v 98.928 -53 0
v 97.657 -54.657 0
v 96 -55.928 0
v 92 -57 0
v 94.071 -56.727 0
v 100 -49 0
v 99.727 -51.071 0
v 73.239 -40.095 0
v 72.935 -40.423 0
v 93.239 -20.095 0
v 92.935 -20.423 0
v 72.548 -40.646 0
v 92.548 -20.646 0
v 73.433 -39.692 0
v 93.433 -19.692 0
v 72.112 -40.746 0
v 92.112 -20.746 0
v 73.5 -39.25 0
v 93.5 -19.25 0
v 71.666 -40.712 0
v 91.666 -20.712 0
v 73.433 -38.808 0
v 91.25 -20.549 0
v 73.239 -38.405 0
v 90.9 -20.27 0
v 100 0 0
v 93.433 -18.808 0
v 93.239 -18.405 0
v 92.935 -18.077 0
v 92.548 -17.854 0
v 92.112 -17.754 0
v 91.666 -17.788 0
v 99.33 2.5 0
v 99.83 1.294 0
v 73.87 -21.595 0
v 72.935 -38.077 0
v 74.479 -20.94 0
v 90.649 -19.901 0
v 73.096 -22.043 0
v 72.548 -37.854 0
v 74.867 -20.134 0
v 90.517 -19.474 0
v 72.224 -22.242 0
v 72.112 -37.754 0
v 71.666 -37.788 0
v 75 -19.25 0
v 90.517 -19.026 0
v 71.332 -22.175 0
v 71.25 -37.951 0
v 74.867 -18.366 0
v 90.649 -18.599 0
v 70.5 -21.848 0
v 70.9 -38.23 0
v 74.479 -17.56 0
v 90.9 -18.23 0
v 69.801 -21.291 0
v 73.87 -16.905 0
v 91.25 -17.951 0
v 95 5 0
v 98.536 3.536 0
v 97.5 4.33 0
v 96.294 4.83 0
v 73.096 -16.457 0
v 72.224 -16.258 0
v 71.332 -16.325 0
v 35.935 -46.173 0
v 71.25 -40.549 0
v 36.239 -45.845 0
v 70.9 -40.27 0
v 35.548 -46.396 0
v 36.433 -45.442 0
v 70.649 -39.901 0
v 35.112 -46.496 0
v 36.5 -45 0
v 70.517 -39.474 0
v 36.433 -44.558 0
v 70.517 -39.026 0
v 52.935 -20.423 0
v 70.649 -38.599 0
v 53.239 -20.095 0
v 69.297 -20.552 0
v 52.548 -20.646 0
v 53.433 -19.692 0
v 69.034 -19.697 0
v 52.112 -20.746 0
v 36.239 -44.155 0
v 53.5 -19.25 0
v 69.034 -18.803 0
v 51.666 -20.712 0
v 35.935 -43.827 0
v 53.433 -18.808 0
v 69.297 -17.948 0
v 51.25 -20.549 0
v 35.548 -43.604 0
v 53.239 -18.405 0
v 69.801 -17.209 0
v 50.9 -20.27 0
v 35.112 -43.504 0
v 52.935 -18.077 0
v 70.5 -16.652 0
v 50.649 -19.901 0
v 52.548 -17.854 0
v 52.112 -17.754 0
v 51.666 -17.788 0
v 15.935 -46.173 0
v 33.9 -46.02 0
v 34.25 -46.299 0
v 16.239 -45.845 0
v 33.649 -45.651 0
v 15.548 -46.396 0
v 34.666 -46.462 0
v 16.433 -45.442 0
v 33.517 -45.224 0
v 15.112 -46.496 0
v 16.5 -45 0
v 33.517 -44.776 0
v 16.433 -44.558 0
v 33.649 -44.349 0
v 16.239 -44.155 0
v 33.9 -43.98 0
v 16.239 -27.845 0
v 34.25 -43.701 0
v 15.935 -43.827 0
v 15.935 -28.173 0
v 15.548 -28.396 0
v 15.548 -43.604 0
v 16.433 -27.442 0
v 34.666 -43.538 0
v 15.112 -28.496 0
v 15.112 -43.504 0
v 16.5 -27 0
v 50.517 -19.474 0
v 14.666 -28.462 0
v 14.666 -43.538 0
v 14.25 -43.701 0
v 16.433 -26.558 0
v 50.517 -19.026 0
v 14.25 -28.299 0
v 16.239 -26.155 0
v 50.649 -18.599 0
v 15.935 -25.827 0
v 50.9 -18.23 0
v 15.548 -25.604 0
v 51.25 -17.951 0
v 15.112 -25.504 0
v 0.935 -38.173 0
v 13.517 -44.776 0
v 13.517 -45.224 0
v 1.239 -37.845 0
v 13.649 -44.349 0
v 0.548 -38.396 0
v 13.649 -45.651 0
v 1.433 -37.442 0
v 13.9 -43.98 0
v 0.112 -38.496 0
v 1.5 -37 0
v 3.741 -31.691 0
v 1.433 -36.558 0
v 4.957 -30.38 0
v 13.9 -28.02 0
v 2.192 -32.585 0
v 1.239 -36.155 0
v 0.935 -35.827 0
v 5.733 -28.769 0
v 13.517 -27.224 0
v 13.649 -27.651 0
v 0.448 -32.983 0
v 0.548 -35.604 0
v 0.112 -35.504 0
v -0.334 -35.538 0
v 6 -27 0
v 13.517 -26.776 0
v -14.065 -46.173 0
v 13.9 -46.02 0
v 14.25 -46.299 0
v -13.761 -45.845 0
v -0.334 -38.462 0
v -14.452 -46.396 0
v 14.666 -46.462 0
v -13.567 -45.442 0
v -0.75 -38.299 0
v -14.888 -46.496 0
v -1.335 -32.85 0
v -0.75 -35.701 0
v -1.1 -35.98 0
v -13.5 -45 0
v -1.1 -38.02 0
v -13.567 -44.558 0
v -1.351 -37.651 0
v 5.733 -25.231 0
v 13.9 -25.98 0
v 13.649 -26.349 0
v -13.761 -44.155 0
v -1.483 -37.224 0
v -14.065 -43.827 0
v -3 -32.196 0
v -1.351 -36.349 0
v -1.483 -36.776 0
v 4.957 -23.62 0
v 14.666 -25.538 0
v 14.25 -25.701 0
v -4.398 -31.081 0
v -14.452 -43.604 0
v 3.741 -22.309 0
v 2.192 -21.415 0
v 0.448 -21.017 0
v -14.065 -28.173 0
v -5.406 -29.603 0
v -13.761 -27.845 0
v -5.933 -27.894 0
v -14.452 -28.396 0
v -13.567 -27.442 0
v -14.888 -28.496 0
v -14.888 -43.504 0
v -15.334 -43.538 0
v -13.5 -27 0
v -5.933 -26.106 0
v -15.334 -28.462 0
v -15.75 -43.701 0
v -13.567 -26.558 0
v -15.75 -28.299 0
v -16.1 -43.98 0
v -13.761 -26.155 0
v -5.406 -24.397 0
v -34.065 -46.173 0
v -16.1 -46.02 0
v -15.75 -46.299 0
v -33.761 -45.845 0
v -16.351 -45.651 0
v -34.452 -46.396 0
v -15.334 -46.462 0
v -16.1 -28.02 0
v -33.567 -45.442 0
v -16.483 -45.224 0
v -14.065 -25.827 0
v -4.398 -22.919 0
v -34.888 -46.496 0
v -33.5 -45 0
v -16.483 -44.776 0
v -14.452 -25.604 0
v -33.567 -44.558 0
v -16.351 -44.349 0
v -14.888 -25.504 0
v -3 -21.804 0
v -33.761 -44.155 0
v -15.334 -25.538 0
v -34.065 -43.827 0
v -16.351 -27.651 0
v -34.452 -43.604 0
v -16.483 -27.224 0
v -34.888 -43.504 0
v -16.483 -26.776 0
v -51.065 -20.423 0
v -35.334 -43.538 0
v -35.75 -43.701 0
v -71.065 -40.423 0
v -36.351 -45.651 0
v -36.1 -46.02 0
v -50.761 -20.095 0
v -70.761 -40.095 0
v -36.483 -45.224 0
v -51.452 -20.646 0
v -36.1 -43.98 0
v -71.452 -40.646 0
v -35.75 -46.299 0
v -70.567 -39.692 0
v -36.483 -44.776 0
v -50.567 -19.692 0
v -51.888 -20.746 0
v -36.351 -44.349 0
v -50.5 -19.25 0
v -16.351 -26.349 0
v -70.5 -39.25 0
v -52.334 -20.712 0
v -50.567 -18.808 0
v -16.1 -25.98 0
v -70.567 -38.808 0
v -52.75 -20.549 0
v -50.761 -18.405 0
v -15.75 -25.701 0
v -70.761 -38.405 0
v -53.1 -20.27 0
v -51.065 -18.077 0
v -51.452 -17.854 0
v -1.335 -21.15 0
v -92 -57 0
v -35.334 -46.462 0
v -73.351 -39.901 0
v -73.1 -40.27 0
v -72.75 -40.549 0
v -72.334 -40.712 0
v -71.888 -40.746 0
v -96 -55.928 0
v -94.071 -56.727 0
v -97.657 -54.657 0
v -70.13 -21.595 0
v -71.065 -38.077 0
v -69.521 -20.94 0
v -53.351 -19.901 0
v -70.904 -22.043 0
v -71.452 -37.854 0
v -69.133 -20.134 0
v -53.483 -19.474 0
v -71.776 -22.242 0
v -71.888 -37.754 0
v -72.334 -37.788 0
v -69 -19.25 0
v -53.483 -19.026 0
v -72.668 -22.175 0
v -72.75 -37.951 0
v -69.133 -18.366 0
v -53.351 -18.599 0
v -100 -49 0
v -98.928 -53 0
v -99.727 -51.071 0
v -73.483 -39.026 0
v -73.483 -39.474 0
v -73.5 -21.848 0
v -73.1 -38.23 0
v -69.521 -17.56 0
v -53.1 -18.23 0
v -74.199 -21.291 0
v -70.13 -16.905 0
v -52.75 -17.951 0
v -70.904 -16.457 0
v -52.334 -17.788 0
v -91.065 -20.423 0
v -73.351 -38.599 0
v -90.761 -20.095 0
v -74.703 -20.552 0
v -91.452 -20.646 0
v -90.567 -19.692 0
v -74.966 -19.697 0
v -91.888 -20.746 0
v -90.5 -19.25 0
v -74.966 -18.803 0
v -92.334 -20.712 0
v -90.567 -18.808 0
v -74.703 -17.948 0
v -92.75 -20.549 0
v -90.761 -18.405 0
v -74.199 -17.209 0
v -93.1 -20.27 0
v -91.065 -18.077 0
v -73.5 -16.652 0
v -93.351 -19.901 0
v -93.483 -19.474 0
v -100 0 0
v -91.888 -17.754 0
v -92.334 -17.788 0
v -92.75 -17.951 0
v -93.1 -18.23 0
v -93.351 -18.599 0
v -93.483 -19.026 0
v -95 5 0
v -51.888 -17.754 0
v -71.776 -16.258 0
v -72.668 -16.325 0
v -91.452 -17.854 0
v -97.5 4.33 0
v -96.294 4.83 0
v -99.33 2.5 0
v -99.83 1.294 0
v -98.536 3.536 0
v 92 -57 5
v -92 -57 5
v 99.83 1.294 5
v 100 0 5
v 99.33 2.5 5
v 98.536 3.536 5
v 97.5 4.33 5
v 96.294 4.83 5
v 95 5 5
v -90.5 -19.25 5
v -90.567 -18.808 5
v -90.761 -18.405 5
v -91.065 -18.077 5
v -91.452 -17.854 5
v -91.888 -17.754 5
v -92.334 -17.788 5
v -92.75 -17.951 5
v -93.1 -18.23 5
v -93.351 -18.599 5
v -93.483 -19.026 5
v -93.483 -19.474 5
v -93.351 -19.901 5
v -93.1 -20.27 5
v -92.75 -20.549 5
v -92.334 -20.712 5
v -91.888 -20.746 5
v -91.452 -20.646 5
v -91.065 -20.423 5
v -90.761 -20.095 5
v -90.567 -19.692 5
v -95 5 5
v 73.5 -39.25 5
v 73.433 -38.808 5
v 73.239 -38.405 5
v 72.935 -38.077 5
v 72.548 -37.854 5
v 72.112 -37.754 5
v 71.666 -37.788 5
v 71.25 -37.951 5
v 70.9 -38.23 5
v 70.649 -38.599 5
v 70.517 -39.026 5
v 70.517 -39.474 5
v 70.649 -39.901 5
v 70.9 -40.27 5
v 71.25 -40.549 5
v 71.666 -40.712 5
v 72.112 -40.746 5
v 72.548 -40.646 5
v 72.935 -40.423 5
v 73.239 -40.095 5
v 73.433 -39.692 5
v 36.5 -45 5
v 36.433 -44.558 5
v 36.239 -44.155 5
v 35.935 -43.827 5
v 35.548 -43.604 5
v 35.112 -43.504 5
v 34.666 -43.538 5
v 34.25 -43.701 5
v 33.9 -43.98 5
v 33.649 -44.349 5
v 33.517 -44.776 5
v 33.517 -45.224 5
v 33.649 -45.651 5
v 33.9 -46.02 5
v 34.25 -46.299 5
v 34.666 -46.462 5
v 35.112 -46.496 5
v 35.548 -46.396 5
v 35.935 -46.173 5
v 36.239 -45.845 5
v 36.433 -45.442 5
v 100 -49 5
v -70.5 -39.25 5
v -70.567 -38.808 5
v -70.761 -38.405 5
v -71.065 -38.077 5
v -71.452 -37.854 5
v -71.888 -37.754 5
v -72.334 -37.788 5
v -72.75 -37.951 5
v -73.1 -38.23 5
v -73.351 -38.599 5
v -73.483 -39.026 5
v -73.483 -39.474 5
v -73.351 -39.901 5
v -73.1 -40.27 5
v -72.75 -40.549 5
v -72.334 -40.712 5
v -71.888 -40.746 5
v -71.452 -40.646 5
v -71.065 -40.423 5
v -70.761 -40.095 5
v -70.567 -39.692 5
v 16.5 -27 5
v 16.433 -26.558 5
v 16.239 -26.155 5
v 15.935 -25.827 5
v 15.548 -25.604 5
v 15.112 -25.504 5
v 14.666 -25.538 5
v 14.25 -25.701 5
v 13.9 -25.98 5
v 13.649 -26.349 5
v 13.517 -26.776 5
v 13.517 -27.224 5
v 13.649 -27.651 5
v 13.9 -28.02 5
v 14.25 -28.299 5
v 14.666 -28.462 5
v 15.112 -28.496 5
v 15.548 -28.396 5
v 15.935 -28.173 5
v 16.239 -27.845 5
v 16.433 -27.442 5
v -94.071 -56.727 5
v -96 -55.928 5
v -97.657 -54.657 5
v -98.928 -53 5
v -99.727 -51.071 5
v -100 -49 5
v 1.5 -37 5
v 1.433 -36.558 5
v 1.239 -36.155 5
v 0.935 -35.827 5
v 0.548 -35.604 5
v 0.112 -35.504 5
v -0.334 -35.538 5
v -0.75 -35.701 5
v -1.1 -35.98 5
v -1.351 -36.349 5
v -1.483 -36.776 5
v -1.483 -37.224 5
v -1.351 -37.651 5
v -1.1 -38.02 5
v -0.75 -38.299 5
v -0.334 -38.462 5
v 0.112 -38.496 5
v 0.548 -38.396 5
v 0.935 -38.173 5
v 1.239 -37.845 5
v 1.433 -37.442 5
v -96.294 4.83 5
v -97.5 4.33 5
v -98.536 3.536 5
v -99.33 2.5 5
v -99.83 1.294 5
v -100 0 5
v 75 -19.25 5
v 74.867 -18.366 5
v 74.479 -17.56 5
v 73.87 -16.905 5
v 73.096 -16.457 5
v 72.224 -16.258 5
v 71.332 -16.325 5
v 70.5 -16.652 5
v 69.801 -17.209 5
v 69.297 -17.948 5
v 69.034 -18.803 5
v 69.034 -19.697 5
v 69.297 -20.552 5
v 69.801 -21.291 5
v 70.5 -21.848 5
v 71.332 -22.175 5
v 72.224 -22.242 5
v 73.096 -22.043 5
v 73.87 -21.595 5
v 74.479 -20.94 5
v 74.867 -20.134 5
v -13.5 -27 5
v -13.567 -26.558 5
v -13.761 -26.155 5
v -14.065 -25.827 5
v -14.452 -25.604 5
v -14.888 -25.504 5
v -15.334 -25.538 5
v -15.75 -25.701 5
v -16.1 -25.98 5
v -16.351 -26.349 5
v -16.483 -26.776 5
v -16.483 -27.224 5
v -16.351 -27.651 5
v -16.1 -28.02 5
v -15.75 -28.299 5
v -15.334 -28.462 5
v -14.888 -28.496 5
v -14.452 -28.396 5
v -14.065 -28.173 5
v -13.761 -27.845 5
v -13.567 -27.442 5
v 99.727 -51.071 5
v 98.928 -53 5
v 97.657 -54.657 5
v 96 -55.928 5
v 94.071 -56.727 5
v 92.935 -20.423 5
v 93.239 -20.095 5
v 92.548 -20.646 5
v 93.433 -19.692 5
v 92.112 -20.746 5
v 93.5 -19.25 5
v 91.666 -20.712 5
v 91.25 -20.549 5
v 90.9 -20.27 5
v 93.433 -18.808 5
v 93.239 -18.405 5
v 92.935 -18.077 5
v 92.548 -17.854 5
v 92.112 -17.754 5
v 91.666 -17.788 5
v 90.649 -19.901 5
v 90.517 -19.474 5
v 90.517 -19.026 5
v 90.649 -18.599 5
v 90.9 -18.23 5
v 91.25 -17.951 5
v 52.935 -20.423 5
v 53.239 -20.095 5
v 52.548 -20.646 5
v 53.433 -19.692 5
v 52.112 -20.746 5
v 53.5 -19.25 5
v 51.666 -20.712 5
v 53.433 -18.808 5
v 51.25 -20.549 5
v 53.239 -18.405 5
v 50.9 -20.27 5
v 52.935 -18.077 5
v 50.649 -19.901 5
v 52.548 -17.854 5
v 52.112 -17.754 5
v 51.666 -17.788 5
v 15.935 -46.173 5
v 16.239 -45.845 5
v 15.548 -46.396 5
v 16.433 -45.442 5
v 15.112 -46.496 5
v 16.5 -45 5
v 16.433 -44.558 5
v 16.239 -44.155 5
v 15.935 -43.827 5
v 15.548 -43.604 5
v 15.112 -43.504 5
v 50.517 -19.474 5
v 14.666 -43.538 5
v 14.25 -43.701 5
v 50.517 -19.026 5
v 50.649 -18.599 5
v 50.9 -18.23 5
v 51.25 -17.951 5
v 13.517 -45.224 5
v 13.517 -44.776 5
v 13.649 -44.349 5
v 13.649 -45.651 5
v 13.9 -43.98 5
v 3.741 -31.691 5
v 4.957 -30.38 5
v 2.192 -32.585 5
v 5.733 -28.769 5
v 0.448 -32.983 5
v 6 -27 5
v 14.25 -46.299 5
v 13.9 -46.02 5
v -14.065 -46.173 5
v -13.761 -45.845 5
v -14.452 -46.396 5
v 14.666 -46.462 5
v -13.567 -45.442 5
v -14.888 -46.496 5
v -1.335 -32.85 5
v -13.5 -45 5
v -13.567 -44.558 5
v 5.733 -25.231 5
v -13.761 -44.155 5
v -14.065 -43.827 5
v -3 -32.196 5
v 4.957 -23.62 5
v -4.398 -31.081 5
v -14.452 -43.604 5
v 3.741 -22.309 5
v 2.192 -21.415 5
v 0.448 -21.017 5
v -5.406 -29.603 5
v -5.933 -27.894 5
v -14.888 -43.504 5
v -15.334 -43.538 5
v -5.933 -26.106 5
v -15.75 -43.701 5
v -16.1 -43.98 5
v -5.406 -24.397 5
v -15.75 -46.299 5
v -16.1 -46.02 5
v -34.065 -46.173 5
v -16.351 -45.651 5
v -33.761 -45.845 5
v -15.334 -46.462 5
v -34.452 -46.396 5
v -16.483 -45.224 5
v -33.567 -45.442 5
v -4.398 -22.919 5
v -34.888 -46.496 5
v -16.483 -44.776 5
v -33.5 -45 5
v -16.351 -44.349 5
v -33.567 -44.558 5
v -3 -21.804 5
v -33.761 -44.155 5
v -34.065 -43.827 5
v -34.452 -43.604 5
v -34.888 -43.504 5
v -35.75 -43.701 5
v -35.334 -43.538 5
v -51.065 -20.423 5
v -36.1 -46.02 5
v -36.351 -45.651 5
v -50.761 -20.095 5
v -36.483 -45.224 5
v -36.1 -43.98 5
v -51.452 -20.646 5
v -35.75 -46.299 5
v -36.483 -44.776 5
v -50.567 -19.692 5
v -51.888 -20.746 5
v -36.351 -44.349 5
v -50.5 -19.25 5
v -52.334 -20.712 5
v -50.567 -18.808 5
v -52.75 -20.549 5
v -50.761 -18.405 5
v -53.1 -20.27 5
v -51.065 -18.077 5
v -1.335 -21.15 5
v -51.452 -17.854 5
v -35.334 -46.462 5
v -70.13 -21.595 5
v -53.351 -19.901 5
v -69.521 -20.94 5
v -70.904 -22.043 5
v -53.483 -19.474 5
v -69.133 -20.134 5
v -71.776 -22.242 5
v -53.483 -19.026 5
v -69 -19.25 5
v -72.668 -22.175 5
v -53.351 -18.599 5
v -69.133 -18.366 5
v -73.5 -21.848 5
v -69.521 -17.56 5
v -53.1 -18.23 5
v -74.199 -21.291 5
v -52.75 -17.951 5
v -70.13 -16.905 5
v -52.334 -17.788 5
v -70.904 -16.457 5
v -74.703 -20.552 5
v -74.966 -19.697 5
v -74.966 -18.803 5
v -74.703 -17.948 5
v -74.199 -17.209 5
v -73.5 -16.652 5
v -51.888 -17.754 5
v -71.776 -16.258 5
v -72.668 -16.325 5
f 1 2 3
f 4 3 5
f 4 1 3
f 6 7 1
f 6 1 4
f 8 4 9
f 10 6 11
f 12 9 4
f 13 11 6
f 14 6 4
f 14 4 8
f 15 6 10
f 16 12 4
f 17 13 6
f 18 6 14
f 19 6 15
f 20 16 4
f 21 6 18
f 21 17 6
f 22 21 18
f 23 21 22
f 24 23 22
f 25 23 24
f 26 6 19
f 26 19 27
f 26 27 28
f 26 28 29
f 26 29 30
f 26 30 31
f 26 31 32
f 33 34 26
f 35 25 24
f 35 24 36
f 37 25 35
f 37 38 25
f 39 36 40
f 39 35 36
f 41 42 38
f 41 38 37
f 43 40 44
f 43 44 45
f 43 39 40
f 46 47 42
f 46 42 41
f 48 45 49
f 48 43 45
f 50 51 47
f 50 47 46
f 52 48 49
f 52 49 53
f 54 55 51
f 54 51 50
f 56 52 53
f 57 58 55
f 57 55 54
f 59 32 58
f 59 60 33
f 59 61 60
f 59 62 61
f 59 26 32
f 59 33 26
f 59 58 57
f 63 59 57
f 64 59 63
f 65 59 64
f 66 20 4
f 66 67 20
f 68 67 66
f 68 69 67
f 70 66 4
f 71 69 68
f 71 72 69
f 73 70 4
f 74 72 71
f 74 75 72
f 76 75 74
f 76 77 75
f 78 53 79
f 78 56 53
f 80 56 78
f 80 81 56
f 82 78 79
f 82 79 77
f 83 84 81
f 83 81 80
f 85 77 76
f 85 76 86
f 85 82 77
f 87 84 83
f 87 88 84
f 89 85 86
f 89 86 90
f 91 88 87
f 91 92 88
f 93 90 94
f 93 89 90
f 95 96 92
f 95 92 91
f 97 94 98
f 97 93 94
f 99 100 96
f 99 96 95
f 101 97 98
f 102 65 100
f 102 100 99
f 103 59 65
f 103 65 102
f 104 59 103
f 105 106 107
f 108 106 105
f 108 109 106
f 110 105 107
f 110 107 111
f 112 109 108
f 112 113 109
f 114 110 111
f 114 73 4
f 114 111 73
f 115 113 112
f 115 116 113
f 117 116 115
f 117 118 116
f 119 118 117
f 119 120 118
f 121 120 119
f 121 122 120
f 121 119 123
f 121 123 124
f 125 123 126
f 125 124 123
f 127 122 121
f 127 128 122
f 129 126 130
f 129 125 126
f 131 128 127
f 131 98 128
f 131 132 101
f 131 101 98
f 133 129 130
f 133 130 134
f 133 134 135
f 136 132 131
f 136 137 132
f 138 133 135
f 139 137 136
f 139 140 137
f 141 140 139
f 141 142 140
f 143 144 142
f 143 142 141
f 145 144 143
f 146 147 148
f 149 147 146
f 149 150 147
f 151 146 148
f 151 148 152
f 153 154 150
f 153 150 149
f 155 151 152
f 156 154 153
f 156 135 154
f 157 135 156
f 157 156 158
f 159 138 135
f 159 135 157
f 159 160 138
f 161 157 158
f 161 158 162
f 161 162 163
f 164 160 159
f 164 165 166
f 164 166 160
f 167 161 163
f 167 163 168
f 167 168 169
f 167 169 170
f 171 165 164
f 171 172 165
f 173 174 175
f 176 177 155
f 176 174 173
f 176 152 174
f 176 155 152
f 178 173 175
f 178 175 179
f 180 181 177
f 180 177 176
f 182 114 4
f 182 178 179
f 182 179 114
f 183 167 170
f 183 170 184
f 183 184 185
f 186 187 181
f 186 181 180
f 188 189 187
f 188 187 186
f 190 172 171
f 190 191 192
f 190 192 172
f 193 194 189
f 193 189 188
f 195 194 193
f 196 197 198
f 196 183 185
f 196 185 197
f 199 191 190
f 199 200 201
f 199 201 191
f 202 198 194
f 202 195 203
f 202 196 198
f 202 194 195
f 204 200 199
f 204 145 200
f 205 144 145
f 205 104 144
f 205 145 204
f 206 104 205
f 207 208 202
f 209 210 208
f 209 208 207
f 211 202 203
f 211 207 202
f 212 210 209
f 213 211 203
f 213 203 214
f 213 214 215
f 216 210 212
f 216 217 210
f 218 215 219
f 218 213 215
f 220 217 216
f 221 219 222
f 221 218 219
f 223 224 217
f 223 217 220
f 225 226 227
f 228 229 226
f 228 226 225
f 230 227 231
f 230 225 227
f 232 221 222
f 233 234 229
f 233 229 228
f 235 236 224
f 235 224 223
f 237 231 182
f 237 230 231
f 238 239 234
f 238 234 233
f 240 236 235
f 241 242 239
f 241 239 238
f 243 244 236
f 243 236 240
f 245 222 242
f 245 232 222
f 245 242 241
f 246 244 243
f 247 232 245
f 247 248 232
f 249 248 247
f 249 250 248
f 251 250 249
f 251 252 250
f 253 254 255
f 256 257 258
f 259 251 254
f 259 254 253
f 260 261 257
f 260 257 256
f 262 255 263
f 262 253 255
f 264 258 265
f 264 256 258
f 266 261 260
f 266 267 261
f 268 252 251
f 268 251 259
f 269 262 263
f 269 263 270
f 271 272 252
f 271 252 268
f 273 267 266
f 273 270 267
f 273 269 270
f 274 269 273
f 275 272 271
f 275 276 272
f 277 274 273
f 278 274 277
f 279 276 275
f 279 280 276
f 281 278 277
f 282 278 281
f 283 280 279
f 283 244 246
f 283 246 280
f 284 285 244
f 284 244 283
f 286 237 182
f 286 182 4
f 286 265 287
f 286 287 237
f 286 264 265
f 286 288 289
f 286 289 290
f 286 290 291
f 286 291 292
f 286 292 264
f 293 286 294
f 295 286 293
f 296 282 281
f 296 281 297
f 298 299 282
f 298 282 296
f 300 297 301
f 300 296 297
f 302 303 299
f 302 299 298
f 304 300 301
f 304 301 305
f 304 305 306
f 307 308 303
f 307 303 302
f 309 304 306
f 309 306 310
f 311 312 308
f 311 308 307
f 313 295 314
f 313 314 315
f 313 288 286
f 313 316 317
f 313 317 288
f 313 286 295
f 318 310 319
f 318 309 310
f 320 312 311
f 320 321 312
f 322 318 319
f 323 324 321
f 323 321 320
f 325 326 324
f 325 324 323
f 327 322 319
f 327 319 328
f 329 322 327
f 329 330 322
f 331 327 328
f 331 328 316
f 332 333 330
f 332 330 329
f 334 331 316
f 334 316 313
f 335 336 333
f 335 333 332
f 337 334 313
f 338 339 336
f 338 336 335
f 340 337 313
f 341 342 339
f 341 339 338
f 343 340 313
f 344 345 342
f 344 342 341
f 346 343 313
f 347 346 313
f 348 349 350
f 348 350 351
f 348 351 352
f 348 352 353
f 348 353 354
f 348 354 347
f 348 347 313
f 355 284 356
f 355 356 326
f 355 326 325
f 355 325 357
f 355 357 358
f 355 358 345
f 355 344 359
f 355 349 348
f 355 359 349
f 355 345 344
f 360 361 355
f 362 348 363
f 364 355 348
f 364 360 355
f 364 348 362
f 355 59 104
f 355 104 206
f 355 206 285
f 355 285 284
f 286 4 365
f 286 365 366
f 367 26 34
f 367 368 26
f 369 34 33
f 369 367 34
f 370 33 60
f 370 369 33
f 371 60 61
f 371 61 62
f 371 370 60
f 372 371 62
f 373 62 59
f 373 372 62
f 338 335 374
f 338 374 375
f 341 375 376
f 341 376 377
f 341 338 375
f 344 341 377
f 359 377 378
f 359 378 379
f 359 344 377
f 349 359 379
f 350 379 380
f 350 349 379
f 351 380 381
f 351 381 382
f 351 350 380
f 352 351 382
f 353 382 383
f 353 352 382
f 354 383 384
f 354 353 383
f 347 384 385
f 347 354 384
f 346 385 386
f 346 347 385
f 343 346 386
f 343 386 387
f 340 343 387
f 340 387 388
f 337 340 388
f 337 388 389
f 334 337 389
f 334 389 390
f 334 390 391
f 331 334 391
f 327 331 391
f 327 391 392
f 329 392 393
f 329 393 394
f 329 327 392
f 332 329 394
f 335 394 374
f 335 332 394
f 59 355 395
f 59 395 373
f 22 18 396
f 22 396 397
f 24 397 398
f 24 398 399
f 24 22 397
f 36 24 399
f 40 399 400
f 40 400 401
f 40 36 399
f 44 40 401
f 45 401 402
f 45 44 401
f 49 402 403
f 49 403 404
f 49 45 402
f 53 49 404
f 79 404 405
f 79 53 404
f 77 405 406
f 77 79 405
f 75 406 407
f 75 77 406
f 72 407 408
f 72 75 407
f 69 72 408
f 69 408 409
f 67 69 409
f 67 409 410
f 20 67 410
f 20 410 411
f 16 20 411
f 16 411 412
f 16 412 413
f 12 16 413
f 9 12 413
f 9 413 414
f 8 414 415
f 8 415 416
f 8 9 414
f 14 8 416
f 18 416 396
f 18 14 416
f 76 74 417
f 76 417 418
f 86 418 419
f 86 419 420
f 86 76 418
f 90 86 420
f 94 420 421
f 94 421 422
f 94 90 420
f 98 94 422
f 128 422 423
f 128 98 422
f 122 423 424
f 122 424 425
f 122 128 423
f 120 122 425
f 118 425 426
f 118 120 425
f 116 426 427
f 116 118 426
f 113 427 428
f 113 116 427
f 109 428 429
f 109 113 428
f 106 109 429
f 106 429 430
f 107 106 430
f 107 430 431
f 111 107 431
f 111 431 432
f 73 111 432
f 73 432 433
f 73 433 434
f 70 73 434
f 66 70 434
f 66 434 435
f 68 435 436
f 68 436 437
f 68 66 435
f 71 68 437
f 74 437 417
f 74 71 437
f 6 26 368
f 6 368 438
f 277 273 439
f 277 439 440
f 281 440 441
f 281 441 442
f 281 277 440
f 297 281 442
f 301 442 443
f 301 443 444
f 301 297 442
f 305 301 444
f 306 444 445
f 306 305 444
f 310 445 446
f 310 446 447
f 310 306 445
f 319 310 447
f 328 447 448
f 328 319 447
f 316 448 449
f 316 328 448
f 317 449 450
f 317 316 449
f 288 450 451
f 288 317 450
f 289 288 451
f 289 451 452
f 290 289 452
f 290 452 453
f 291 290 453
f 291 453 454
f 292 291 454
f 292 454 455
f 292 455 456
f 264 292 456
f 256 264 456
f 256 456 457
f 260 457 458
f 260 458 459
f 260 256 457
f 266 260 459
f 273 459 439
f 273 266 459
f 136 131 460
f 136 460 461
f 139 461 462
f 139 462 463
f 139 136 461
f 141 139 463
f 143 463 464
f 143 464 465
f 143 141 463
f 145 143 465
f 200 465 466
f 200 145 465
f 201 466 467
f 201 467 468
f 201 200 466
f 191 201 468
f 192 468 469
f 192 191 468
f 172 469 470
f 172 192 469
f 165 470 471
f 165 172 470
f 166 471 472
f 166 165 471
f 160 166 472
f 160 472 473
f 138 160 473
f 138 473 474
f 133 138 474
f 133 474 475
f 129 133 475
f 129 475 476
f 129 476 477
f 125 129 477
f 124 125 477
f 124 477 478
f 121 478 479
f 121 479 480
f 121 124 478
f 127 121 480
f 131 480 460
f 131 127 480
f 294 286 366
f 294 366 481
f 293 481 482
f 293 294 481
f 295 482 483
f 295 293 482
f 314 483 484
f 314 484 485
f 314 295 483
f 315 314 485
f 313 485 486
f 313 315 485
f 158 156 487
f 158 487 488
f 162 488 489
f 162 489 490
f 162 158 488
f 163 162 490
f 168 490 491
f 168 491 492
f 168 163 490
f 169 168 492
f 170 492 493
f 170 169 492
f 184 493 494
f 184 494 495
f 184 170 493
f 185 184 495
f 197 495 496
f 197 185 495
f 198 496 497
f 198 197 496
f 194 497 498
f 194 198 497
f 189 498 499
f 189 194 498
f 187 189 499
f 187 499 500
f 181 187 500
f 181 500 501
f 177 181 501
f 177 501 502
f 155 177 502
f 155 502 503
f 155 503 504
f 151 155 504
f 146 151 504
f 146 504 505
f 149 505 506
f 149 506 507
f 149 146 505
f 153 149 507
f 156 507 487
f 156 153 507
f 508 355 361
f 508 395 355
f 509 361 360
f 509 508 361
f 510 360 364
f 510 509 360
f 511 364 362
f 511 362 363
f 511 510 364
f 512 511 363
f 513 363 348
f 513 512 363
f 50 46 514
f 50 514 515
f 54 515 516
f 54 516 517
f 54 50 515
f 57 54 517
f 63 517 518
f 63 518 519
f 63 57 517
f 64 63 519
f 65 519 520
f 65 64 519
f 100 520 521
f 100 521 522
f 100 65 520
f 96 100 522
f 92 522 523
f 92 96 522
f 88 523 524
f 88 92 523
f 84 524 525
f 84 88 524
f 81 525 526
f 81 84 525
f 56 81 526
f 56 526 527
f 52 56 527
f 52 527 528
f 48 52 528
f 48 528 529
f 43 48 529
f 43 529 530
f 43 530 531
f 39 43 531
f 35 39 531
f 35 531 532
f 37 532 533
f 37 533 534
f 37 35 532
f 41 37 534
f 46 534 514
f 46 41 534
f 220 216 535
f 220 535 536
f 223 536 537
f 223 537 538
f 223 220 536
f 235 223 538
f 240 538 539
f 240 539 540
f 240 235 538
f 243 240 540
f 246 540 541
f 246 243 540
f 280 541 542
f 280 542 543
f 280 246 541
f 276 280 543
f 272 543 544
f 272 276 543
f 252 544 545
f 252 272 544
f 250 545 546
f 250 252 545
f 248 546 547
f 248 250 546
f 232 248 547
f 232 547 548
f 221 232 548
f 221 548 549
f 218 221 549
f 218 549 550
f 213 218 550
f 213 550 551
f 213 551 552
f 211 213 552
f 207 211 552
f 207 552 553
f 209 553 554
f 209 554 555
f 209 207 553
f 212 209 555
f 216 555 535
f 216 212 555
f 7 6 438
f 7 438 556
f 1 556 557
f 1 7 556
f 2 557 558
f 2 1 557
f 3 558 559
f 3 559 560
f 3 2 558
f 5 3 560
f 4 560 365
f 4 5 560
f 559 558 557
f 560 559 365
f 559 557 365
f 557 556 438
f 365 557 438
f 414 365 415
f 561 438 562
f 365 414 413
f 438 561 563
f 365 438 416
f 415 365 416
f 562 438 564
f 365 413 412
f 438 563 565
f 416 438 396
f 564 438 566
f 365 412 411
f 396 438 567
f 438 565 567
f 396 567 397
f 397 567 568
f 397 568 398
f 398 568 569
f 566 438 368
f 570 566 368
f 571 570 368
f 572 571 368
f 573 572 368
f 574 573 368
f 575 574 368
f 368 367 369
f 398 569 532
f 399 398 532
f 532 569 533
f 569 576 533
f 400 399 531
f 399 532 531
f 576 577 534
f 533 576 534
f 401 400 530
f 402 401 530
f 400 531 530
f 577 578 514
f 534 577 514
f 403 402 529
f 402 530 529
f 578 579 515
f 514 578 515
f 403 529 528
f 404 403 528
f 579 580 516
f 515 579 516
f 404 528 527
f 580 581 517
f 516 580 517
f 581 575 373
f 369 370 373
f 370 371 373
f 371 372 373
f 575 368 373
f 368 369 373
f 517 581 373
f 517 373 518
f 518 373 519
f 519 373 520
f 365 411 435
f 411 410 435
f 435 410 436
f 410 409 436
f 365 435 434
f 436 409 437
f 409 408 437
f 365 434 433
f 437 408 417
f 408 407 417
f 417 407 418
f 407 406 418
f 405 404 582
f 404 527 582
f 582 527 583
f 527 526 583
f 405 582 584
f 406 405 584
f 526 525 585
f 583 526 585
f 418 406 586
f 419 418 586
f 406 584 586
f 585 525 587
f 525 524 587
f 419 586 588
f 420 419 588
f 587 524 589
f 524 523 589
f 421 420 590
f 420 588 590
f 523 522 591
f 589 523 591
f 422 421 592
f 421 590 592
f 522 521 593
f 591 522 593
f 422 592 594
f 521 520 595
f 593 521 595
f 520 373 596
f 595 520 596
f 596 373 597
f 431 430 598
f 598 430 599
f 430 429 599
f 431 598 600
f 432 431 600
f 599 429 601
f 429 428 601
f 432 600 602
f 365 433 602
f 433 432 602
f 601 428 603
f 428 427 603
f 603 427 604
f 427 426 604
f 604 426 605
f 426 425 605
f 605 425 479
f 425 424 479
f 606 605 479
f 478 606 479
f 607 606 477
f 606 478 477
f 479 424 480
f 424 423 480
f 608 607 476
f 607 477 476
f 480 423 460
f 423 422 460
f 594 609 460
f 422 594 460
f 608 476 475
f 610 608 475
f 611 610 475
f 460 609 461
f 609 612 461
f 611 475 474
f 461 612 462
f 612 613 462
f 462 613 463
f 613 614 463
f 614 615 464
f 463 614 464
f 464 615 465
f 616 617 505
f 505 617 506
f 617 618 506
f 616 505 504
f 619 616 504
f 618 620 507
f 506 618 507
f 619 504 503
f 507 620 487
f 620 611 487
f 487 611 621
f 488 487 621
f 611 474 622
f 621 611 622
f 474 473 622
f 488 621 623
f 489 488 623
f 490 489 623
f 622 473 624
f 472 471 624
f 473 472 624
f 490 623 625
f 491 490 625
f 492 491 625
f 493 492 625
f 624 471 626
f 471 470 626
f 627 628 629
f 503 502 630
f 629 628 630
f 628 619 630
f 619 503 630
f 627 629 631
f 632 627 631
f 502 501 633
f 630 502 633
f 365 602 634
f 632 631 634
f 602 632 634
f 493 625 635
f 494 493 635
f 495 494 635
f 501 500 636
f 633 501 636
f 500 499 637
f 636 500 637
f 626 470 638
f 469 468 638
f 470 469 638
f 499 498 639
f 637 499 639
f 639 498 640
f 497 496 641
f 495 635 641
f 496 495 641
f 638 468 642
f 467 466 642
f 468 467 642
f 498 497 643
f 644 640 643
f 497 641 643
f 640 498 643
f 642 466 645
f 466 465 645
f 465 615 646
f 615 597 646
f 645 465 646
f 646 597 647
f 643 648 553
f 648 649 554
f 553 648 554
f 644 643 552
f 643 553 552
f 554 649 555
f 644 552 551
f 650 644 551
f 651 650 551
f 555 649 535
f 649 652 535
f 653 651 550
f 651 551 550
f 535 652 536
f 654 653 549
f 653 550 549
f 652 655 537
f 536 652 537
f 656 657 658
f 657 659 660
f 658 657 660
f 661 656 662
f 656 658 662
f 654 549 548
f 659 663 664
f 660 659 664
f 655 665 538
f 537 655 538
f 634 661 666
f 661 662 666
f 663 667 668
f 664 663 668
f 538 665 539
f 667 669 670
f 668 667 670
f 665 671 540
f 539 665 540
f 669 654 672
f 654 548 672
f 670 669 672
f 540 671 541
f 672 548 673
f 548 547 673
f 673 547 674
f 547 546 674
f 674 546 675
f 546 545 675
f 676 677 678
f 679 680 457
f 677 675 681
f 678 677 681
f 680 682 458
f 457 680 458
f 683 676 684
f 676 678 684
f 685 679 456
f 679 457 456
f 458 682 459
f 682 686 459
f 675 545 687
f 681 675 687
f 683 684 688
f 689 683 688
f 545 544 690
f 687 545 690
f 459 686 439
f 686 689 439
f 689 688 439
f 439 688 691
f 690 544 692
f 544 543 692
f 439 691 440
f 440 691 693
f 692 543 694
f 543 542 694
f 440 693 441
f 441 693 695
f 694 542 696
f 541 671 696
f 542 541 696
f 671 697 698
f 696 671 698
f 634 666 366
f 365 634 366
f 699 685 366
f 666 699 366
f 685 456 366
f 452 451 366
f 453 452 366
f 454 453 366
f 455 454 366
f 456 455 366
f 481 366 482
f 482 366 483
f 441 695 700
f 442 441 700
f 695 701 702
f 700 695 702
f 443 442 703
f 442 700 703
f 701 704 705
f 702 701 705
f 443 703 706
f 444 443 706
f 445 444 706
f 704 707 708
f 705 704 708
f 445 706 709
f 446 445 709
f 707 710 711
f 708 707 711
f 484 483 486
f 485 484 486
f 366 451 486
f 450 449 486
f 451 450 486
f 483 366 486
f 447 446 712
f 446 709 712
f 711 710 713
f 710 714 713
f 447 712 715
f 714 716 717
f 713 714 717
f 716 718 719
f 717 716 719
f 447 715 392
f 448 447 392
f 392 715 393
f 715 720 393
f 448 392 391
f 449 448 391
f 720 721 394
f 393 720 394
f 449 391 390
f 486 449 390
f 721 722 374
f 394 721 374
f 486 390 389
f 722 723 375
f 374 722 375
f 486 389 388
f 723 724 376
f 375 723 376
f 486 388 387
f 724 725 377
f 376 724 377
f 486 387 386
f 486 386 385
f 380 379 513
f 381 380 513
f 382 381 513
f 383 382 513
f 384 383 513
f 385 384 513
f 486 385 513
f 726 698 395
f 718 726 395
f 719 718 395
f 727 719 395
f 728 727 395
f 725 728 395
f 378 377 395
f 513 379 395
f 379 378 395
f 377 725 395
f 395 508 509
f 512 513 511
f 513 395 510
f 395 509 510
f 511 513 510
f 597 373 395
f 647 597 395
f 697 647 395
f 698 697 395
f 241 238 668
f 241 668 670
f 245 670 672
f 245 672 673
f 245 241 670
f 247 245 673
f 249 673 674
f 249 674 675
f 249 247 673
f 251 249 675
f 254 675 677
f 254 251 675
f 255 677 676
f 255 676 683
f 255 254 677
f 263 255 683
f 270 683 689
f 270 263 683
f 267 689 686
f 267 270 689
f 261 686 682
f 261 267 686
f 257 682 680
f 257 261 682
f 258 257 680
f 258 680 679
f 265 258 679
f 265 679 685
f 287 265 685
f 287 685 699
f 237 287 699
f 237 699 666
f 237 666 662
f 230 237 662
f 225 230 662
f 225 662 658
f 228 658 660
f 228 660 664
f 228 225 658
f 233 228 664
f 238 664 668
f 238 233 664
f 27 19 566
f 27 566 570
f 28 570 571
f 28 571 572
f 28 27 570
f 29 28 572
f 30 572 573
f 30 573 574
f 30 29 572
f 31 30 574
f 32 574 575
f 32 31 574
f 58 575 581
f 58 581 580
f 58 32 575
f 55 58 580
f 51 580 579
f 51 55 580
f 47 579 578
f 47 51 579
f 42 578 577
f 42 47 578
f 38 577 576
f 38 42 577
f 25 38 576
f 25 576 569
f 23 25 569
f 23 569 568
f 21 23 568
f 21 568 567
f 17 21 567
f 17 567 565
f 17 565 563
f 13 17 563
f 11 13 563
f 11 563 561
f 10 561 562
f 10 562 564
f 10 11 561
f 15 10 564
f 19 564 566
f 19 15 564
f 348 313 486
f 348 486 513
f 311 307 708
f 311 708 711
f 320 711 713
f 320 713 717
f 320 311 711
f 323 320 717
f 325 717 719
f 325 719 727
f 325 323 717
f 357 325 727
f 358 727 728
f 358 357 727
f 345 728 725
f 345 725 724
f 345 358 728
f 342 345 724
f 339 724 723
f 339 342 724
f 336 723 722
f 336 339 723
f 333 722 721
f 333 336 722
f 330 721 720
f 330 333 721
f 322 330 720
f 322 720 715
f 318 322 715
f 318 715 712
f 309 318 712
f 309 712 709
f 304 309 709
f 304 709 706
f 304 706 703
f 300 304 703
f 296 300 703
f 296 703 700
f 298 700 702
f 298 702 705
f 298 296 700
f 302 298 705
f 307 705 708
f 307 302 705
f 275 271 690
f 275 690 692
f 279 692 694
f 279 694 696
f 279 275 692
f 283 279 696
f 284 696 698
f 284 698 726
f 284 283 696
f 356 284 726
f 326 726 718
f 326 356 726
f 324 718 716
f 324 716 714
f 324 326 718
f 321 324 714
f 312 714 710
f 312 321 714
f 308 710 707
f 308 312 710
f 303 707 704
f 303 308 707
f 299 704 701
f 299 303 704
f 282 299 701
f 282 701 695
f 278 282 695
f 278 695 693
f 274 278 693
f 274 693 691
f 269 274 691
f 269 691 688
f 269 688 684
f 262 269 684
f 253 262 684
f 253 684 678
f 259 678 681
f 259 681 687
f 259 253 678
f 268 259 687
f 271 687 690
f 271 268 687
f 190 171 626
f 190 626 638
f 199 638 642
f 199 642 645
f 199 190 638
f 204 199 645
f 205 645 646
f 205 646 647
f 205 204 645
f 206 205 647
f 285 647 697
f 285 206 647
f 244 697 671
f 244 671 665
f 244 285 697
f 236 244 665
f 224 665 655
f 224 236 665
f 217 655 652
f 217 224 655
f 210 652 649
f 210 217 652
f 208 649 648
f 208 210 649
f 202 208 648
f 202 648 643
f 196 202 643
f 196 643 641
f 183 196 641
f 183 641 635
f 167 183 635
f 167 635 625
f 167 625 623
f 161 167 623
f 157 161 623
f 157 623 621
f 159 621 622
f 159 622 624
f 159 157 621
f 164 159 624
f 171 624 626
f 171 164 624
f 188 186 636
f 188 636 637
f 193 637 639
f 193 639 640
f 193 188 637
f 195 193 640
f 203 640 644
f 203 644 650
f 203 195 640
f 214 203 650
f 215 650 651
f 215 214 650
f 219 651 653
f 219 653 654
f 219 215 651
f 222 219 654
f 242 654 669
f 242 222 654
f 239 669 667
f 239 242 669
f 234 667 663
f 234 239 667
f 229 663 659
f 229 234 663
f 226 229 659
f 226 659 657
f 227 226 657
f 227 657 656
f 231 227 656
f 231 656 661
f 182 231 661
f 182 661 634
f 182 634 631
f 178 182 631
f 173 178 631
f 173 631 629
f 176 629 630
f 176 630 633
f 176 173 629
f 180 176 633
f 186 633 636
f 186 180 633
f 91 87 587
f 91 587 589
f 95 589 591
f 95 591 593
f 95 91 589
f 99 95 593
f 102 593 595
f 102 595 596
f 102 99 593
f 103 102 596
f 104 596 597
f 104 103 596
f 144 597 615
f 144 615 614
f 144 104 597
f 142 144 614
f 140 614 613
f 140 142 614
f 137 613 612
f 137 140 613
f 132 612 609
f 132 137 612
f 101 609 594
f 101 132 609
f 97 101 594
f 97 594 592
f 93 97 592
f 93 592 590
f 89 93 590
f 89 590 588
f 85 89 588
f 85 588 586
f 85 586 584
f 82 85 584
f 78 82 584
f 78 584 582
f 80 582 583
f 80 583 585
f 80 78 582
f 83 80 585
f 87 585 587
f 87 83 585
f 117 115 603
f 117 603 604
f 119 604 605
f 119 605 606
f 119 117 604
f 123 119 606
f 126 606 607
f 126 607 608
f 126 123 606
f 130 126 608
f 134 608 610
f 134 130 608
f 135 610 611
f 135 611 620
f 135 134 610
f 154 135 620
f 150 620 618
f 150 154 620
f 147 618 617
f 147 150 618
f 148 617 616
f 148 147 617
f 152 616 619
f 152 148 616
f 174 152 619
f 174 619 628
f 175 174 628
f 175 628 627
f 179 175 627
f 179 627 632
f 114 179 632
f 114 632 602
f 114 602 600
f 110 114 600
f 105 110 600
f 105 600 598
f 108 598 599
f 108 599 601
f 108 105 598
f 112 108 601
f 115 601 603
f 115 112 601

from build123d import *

# Parameters (mm, degrees)
CROQUIS1_R              = 6
CROQUIS1_R_2            = 3
CROQUIS1_R_3            = 1.5
SALIENTE_EXTRUIR1_DEPTH = 5
REDONDEO1_R             = 5


with BuildPart() as part:
    # Croquis1 → Saliente-Extruir1 (new body)
    with BuildSketch(Plane.XY):
        with BuildLine():
            Line((100, 0), (100, -49))
            ThreePointArc((100, -49), (97.656854249, -54.656854249), (92, -57))
            Line((92, -57), (-92, -57))
            ThreePointArc((-92, -57), (-97.656854249, -54.656854249), (-100, -49))
            Line((-100, -49), (-100, 0))
            Line((-100, 0), (-100, 5))
            Line((-100, 5), (100, 5))
            Line((100, 5), (100, 0))
        make_face()
        with Locations((0, -27)):
            Circle(CROQUIS1_R, mode=Mode.SUBTRACT)
        with Locations((72, -19.25)):
            Circle(CROQUIS1_R_2, mode=Mode.SUBTRACT)
        with Locations((-72, -19.25)):
            Circle(CROQUIS1_R_2, mode=Mode.SUBTRACT)
        with Locations((72, -39.25)):
            Circle(CROQUIS1_R_3, mode=Mode.SUBTRACT)
        with Locations((52, -19.25)):
            Circle(CROQUIS1_R_3, mode=Mode.SUBTRACT)
        with Locations((92, -19.25)):
            Circle(CROQUIS1_R_3, mode=Mode.SUBTRACT)
        with Locations((-72, -39.25)):
            Circle(CROQUIS1_R_3, mode=Mode.SUBTRACT)
        with Locations((-92, -19.25)):
            Circle(CROQUIS1_R_3, mode=Mode.SUBTRACT)
        with Locations((-52, -19.25)):
            Circle(CROQUIS1_R_3, mode=Mode.SUBTRACT)
        with Locations((15, -45)):
            Circle(CROQUIS1_R_3, mode=Mode.SUBTRACT)
        with Locations((35, -45)):
            Circle(CROQUIS1_R_3, mode=Mode.SUBTRACT)
        with Locations((-35, -45)):
            Circle(CROQUIS1_R_3, mode=Mode.SUBTRACT)
        with Locations((-15, -45)):
            Circle(CROQUIS1_R_3, mode=Mode.SUBTRACT)
        with Locations((-15, -27)):
            Circle(CROQUIS1_R_3, mode=Mode.SUBTRACT)
        with Locations((15, -27)):
            Circle(CROQUIS1_R_3, mode=Mode.SUBTRACT)
        with Locations((0, -37)):
            Circle(CROQUIS1_R_3, mode=Mode.SUBTRACT)
    extrude(amount=SALIENTE_EXTRUIR1_DEPTH)

    # Redondeo1
    redondeo1_edges = [part.edges().sort_by_distance(p)[0] for p in [
        (-100, 5, 2.5),
        (100, 5, 2.5),
    ]]
    fillet(redondeo1_edges, radius=REDONDEO1_R)


solid = part.part
